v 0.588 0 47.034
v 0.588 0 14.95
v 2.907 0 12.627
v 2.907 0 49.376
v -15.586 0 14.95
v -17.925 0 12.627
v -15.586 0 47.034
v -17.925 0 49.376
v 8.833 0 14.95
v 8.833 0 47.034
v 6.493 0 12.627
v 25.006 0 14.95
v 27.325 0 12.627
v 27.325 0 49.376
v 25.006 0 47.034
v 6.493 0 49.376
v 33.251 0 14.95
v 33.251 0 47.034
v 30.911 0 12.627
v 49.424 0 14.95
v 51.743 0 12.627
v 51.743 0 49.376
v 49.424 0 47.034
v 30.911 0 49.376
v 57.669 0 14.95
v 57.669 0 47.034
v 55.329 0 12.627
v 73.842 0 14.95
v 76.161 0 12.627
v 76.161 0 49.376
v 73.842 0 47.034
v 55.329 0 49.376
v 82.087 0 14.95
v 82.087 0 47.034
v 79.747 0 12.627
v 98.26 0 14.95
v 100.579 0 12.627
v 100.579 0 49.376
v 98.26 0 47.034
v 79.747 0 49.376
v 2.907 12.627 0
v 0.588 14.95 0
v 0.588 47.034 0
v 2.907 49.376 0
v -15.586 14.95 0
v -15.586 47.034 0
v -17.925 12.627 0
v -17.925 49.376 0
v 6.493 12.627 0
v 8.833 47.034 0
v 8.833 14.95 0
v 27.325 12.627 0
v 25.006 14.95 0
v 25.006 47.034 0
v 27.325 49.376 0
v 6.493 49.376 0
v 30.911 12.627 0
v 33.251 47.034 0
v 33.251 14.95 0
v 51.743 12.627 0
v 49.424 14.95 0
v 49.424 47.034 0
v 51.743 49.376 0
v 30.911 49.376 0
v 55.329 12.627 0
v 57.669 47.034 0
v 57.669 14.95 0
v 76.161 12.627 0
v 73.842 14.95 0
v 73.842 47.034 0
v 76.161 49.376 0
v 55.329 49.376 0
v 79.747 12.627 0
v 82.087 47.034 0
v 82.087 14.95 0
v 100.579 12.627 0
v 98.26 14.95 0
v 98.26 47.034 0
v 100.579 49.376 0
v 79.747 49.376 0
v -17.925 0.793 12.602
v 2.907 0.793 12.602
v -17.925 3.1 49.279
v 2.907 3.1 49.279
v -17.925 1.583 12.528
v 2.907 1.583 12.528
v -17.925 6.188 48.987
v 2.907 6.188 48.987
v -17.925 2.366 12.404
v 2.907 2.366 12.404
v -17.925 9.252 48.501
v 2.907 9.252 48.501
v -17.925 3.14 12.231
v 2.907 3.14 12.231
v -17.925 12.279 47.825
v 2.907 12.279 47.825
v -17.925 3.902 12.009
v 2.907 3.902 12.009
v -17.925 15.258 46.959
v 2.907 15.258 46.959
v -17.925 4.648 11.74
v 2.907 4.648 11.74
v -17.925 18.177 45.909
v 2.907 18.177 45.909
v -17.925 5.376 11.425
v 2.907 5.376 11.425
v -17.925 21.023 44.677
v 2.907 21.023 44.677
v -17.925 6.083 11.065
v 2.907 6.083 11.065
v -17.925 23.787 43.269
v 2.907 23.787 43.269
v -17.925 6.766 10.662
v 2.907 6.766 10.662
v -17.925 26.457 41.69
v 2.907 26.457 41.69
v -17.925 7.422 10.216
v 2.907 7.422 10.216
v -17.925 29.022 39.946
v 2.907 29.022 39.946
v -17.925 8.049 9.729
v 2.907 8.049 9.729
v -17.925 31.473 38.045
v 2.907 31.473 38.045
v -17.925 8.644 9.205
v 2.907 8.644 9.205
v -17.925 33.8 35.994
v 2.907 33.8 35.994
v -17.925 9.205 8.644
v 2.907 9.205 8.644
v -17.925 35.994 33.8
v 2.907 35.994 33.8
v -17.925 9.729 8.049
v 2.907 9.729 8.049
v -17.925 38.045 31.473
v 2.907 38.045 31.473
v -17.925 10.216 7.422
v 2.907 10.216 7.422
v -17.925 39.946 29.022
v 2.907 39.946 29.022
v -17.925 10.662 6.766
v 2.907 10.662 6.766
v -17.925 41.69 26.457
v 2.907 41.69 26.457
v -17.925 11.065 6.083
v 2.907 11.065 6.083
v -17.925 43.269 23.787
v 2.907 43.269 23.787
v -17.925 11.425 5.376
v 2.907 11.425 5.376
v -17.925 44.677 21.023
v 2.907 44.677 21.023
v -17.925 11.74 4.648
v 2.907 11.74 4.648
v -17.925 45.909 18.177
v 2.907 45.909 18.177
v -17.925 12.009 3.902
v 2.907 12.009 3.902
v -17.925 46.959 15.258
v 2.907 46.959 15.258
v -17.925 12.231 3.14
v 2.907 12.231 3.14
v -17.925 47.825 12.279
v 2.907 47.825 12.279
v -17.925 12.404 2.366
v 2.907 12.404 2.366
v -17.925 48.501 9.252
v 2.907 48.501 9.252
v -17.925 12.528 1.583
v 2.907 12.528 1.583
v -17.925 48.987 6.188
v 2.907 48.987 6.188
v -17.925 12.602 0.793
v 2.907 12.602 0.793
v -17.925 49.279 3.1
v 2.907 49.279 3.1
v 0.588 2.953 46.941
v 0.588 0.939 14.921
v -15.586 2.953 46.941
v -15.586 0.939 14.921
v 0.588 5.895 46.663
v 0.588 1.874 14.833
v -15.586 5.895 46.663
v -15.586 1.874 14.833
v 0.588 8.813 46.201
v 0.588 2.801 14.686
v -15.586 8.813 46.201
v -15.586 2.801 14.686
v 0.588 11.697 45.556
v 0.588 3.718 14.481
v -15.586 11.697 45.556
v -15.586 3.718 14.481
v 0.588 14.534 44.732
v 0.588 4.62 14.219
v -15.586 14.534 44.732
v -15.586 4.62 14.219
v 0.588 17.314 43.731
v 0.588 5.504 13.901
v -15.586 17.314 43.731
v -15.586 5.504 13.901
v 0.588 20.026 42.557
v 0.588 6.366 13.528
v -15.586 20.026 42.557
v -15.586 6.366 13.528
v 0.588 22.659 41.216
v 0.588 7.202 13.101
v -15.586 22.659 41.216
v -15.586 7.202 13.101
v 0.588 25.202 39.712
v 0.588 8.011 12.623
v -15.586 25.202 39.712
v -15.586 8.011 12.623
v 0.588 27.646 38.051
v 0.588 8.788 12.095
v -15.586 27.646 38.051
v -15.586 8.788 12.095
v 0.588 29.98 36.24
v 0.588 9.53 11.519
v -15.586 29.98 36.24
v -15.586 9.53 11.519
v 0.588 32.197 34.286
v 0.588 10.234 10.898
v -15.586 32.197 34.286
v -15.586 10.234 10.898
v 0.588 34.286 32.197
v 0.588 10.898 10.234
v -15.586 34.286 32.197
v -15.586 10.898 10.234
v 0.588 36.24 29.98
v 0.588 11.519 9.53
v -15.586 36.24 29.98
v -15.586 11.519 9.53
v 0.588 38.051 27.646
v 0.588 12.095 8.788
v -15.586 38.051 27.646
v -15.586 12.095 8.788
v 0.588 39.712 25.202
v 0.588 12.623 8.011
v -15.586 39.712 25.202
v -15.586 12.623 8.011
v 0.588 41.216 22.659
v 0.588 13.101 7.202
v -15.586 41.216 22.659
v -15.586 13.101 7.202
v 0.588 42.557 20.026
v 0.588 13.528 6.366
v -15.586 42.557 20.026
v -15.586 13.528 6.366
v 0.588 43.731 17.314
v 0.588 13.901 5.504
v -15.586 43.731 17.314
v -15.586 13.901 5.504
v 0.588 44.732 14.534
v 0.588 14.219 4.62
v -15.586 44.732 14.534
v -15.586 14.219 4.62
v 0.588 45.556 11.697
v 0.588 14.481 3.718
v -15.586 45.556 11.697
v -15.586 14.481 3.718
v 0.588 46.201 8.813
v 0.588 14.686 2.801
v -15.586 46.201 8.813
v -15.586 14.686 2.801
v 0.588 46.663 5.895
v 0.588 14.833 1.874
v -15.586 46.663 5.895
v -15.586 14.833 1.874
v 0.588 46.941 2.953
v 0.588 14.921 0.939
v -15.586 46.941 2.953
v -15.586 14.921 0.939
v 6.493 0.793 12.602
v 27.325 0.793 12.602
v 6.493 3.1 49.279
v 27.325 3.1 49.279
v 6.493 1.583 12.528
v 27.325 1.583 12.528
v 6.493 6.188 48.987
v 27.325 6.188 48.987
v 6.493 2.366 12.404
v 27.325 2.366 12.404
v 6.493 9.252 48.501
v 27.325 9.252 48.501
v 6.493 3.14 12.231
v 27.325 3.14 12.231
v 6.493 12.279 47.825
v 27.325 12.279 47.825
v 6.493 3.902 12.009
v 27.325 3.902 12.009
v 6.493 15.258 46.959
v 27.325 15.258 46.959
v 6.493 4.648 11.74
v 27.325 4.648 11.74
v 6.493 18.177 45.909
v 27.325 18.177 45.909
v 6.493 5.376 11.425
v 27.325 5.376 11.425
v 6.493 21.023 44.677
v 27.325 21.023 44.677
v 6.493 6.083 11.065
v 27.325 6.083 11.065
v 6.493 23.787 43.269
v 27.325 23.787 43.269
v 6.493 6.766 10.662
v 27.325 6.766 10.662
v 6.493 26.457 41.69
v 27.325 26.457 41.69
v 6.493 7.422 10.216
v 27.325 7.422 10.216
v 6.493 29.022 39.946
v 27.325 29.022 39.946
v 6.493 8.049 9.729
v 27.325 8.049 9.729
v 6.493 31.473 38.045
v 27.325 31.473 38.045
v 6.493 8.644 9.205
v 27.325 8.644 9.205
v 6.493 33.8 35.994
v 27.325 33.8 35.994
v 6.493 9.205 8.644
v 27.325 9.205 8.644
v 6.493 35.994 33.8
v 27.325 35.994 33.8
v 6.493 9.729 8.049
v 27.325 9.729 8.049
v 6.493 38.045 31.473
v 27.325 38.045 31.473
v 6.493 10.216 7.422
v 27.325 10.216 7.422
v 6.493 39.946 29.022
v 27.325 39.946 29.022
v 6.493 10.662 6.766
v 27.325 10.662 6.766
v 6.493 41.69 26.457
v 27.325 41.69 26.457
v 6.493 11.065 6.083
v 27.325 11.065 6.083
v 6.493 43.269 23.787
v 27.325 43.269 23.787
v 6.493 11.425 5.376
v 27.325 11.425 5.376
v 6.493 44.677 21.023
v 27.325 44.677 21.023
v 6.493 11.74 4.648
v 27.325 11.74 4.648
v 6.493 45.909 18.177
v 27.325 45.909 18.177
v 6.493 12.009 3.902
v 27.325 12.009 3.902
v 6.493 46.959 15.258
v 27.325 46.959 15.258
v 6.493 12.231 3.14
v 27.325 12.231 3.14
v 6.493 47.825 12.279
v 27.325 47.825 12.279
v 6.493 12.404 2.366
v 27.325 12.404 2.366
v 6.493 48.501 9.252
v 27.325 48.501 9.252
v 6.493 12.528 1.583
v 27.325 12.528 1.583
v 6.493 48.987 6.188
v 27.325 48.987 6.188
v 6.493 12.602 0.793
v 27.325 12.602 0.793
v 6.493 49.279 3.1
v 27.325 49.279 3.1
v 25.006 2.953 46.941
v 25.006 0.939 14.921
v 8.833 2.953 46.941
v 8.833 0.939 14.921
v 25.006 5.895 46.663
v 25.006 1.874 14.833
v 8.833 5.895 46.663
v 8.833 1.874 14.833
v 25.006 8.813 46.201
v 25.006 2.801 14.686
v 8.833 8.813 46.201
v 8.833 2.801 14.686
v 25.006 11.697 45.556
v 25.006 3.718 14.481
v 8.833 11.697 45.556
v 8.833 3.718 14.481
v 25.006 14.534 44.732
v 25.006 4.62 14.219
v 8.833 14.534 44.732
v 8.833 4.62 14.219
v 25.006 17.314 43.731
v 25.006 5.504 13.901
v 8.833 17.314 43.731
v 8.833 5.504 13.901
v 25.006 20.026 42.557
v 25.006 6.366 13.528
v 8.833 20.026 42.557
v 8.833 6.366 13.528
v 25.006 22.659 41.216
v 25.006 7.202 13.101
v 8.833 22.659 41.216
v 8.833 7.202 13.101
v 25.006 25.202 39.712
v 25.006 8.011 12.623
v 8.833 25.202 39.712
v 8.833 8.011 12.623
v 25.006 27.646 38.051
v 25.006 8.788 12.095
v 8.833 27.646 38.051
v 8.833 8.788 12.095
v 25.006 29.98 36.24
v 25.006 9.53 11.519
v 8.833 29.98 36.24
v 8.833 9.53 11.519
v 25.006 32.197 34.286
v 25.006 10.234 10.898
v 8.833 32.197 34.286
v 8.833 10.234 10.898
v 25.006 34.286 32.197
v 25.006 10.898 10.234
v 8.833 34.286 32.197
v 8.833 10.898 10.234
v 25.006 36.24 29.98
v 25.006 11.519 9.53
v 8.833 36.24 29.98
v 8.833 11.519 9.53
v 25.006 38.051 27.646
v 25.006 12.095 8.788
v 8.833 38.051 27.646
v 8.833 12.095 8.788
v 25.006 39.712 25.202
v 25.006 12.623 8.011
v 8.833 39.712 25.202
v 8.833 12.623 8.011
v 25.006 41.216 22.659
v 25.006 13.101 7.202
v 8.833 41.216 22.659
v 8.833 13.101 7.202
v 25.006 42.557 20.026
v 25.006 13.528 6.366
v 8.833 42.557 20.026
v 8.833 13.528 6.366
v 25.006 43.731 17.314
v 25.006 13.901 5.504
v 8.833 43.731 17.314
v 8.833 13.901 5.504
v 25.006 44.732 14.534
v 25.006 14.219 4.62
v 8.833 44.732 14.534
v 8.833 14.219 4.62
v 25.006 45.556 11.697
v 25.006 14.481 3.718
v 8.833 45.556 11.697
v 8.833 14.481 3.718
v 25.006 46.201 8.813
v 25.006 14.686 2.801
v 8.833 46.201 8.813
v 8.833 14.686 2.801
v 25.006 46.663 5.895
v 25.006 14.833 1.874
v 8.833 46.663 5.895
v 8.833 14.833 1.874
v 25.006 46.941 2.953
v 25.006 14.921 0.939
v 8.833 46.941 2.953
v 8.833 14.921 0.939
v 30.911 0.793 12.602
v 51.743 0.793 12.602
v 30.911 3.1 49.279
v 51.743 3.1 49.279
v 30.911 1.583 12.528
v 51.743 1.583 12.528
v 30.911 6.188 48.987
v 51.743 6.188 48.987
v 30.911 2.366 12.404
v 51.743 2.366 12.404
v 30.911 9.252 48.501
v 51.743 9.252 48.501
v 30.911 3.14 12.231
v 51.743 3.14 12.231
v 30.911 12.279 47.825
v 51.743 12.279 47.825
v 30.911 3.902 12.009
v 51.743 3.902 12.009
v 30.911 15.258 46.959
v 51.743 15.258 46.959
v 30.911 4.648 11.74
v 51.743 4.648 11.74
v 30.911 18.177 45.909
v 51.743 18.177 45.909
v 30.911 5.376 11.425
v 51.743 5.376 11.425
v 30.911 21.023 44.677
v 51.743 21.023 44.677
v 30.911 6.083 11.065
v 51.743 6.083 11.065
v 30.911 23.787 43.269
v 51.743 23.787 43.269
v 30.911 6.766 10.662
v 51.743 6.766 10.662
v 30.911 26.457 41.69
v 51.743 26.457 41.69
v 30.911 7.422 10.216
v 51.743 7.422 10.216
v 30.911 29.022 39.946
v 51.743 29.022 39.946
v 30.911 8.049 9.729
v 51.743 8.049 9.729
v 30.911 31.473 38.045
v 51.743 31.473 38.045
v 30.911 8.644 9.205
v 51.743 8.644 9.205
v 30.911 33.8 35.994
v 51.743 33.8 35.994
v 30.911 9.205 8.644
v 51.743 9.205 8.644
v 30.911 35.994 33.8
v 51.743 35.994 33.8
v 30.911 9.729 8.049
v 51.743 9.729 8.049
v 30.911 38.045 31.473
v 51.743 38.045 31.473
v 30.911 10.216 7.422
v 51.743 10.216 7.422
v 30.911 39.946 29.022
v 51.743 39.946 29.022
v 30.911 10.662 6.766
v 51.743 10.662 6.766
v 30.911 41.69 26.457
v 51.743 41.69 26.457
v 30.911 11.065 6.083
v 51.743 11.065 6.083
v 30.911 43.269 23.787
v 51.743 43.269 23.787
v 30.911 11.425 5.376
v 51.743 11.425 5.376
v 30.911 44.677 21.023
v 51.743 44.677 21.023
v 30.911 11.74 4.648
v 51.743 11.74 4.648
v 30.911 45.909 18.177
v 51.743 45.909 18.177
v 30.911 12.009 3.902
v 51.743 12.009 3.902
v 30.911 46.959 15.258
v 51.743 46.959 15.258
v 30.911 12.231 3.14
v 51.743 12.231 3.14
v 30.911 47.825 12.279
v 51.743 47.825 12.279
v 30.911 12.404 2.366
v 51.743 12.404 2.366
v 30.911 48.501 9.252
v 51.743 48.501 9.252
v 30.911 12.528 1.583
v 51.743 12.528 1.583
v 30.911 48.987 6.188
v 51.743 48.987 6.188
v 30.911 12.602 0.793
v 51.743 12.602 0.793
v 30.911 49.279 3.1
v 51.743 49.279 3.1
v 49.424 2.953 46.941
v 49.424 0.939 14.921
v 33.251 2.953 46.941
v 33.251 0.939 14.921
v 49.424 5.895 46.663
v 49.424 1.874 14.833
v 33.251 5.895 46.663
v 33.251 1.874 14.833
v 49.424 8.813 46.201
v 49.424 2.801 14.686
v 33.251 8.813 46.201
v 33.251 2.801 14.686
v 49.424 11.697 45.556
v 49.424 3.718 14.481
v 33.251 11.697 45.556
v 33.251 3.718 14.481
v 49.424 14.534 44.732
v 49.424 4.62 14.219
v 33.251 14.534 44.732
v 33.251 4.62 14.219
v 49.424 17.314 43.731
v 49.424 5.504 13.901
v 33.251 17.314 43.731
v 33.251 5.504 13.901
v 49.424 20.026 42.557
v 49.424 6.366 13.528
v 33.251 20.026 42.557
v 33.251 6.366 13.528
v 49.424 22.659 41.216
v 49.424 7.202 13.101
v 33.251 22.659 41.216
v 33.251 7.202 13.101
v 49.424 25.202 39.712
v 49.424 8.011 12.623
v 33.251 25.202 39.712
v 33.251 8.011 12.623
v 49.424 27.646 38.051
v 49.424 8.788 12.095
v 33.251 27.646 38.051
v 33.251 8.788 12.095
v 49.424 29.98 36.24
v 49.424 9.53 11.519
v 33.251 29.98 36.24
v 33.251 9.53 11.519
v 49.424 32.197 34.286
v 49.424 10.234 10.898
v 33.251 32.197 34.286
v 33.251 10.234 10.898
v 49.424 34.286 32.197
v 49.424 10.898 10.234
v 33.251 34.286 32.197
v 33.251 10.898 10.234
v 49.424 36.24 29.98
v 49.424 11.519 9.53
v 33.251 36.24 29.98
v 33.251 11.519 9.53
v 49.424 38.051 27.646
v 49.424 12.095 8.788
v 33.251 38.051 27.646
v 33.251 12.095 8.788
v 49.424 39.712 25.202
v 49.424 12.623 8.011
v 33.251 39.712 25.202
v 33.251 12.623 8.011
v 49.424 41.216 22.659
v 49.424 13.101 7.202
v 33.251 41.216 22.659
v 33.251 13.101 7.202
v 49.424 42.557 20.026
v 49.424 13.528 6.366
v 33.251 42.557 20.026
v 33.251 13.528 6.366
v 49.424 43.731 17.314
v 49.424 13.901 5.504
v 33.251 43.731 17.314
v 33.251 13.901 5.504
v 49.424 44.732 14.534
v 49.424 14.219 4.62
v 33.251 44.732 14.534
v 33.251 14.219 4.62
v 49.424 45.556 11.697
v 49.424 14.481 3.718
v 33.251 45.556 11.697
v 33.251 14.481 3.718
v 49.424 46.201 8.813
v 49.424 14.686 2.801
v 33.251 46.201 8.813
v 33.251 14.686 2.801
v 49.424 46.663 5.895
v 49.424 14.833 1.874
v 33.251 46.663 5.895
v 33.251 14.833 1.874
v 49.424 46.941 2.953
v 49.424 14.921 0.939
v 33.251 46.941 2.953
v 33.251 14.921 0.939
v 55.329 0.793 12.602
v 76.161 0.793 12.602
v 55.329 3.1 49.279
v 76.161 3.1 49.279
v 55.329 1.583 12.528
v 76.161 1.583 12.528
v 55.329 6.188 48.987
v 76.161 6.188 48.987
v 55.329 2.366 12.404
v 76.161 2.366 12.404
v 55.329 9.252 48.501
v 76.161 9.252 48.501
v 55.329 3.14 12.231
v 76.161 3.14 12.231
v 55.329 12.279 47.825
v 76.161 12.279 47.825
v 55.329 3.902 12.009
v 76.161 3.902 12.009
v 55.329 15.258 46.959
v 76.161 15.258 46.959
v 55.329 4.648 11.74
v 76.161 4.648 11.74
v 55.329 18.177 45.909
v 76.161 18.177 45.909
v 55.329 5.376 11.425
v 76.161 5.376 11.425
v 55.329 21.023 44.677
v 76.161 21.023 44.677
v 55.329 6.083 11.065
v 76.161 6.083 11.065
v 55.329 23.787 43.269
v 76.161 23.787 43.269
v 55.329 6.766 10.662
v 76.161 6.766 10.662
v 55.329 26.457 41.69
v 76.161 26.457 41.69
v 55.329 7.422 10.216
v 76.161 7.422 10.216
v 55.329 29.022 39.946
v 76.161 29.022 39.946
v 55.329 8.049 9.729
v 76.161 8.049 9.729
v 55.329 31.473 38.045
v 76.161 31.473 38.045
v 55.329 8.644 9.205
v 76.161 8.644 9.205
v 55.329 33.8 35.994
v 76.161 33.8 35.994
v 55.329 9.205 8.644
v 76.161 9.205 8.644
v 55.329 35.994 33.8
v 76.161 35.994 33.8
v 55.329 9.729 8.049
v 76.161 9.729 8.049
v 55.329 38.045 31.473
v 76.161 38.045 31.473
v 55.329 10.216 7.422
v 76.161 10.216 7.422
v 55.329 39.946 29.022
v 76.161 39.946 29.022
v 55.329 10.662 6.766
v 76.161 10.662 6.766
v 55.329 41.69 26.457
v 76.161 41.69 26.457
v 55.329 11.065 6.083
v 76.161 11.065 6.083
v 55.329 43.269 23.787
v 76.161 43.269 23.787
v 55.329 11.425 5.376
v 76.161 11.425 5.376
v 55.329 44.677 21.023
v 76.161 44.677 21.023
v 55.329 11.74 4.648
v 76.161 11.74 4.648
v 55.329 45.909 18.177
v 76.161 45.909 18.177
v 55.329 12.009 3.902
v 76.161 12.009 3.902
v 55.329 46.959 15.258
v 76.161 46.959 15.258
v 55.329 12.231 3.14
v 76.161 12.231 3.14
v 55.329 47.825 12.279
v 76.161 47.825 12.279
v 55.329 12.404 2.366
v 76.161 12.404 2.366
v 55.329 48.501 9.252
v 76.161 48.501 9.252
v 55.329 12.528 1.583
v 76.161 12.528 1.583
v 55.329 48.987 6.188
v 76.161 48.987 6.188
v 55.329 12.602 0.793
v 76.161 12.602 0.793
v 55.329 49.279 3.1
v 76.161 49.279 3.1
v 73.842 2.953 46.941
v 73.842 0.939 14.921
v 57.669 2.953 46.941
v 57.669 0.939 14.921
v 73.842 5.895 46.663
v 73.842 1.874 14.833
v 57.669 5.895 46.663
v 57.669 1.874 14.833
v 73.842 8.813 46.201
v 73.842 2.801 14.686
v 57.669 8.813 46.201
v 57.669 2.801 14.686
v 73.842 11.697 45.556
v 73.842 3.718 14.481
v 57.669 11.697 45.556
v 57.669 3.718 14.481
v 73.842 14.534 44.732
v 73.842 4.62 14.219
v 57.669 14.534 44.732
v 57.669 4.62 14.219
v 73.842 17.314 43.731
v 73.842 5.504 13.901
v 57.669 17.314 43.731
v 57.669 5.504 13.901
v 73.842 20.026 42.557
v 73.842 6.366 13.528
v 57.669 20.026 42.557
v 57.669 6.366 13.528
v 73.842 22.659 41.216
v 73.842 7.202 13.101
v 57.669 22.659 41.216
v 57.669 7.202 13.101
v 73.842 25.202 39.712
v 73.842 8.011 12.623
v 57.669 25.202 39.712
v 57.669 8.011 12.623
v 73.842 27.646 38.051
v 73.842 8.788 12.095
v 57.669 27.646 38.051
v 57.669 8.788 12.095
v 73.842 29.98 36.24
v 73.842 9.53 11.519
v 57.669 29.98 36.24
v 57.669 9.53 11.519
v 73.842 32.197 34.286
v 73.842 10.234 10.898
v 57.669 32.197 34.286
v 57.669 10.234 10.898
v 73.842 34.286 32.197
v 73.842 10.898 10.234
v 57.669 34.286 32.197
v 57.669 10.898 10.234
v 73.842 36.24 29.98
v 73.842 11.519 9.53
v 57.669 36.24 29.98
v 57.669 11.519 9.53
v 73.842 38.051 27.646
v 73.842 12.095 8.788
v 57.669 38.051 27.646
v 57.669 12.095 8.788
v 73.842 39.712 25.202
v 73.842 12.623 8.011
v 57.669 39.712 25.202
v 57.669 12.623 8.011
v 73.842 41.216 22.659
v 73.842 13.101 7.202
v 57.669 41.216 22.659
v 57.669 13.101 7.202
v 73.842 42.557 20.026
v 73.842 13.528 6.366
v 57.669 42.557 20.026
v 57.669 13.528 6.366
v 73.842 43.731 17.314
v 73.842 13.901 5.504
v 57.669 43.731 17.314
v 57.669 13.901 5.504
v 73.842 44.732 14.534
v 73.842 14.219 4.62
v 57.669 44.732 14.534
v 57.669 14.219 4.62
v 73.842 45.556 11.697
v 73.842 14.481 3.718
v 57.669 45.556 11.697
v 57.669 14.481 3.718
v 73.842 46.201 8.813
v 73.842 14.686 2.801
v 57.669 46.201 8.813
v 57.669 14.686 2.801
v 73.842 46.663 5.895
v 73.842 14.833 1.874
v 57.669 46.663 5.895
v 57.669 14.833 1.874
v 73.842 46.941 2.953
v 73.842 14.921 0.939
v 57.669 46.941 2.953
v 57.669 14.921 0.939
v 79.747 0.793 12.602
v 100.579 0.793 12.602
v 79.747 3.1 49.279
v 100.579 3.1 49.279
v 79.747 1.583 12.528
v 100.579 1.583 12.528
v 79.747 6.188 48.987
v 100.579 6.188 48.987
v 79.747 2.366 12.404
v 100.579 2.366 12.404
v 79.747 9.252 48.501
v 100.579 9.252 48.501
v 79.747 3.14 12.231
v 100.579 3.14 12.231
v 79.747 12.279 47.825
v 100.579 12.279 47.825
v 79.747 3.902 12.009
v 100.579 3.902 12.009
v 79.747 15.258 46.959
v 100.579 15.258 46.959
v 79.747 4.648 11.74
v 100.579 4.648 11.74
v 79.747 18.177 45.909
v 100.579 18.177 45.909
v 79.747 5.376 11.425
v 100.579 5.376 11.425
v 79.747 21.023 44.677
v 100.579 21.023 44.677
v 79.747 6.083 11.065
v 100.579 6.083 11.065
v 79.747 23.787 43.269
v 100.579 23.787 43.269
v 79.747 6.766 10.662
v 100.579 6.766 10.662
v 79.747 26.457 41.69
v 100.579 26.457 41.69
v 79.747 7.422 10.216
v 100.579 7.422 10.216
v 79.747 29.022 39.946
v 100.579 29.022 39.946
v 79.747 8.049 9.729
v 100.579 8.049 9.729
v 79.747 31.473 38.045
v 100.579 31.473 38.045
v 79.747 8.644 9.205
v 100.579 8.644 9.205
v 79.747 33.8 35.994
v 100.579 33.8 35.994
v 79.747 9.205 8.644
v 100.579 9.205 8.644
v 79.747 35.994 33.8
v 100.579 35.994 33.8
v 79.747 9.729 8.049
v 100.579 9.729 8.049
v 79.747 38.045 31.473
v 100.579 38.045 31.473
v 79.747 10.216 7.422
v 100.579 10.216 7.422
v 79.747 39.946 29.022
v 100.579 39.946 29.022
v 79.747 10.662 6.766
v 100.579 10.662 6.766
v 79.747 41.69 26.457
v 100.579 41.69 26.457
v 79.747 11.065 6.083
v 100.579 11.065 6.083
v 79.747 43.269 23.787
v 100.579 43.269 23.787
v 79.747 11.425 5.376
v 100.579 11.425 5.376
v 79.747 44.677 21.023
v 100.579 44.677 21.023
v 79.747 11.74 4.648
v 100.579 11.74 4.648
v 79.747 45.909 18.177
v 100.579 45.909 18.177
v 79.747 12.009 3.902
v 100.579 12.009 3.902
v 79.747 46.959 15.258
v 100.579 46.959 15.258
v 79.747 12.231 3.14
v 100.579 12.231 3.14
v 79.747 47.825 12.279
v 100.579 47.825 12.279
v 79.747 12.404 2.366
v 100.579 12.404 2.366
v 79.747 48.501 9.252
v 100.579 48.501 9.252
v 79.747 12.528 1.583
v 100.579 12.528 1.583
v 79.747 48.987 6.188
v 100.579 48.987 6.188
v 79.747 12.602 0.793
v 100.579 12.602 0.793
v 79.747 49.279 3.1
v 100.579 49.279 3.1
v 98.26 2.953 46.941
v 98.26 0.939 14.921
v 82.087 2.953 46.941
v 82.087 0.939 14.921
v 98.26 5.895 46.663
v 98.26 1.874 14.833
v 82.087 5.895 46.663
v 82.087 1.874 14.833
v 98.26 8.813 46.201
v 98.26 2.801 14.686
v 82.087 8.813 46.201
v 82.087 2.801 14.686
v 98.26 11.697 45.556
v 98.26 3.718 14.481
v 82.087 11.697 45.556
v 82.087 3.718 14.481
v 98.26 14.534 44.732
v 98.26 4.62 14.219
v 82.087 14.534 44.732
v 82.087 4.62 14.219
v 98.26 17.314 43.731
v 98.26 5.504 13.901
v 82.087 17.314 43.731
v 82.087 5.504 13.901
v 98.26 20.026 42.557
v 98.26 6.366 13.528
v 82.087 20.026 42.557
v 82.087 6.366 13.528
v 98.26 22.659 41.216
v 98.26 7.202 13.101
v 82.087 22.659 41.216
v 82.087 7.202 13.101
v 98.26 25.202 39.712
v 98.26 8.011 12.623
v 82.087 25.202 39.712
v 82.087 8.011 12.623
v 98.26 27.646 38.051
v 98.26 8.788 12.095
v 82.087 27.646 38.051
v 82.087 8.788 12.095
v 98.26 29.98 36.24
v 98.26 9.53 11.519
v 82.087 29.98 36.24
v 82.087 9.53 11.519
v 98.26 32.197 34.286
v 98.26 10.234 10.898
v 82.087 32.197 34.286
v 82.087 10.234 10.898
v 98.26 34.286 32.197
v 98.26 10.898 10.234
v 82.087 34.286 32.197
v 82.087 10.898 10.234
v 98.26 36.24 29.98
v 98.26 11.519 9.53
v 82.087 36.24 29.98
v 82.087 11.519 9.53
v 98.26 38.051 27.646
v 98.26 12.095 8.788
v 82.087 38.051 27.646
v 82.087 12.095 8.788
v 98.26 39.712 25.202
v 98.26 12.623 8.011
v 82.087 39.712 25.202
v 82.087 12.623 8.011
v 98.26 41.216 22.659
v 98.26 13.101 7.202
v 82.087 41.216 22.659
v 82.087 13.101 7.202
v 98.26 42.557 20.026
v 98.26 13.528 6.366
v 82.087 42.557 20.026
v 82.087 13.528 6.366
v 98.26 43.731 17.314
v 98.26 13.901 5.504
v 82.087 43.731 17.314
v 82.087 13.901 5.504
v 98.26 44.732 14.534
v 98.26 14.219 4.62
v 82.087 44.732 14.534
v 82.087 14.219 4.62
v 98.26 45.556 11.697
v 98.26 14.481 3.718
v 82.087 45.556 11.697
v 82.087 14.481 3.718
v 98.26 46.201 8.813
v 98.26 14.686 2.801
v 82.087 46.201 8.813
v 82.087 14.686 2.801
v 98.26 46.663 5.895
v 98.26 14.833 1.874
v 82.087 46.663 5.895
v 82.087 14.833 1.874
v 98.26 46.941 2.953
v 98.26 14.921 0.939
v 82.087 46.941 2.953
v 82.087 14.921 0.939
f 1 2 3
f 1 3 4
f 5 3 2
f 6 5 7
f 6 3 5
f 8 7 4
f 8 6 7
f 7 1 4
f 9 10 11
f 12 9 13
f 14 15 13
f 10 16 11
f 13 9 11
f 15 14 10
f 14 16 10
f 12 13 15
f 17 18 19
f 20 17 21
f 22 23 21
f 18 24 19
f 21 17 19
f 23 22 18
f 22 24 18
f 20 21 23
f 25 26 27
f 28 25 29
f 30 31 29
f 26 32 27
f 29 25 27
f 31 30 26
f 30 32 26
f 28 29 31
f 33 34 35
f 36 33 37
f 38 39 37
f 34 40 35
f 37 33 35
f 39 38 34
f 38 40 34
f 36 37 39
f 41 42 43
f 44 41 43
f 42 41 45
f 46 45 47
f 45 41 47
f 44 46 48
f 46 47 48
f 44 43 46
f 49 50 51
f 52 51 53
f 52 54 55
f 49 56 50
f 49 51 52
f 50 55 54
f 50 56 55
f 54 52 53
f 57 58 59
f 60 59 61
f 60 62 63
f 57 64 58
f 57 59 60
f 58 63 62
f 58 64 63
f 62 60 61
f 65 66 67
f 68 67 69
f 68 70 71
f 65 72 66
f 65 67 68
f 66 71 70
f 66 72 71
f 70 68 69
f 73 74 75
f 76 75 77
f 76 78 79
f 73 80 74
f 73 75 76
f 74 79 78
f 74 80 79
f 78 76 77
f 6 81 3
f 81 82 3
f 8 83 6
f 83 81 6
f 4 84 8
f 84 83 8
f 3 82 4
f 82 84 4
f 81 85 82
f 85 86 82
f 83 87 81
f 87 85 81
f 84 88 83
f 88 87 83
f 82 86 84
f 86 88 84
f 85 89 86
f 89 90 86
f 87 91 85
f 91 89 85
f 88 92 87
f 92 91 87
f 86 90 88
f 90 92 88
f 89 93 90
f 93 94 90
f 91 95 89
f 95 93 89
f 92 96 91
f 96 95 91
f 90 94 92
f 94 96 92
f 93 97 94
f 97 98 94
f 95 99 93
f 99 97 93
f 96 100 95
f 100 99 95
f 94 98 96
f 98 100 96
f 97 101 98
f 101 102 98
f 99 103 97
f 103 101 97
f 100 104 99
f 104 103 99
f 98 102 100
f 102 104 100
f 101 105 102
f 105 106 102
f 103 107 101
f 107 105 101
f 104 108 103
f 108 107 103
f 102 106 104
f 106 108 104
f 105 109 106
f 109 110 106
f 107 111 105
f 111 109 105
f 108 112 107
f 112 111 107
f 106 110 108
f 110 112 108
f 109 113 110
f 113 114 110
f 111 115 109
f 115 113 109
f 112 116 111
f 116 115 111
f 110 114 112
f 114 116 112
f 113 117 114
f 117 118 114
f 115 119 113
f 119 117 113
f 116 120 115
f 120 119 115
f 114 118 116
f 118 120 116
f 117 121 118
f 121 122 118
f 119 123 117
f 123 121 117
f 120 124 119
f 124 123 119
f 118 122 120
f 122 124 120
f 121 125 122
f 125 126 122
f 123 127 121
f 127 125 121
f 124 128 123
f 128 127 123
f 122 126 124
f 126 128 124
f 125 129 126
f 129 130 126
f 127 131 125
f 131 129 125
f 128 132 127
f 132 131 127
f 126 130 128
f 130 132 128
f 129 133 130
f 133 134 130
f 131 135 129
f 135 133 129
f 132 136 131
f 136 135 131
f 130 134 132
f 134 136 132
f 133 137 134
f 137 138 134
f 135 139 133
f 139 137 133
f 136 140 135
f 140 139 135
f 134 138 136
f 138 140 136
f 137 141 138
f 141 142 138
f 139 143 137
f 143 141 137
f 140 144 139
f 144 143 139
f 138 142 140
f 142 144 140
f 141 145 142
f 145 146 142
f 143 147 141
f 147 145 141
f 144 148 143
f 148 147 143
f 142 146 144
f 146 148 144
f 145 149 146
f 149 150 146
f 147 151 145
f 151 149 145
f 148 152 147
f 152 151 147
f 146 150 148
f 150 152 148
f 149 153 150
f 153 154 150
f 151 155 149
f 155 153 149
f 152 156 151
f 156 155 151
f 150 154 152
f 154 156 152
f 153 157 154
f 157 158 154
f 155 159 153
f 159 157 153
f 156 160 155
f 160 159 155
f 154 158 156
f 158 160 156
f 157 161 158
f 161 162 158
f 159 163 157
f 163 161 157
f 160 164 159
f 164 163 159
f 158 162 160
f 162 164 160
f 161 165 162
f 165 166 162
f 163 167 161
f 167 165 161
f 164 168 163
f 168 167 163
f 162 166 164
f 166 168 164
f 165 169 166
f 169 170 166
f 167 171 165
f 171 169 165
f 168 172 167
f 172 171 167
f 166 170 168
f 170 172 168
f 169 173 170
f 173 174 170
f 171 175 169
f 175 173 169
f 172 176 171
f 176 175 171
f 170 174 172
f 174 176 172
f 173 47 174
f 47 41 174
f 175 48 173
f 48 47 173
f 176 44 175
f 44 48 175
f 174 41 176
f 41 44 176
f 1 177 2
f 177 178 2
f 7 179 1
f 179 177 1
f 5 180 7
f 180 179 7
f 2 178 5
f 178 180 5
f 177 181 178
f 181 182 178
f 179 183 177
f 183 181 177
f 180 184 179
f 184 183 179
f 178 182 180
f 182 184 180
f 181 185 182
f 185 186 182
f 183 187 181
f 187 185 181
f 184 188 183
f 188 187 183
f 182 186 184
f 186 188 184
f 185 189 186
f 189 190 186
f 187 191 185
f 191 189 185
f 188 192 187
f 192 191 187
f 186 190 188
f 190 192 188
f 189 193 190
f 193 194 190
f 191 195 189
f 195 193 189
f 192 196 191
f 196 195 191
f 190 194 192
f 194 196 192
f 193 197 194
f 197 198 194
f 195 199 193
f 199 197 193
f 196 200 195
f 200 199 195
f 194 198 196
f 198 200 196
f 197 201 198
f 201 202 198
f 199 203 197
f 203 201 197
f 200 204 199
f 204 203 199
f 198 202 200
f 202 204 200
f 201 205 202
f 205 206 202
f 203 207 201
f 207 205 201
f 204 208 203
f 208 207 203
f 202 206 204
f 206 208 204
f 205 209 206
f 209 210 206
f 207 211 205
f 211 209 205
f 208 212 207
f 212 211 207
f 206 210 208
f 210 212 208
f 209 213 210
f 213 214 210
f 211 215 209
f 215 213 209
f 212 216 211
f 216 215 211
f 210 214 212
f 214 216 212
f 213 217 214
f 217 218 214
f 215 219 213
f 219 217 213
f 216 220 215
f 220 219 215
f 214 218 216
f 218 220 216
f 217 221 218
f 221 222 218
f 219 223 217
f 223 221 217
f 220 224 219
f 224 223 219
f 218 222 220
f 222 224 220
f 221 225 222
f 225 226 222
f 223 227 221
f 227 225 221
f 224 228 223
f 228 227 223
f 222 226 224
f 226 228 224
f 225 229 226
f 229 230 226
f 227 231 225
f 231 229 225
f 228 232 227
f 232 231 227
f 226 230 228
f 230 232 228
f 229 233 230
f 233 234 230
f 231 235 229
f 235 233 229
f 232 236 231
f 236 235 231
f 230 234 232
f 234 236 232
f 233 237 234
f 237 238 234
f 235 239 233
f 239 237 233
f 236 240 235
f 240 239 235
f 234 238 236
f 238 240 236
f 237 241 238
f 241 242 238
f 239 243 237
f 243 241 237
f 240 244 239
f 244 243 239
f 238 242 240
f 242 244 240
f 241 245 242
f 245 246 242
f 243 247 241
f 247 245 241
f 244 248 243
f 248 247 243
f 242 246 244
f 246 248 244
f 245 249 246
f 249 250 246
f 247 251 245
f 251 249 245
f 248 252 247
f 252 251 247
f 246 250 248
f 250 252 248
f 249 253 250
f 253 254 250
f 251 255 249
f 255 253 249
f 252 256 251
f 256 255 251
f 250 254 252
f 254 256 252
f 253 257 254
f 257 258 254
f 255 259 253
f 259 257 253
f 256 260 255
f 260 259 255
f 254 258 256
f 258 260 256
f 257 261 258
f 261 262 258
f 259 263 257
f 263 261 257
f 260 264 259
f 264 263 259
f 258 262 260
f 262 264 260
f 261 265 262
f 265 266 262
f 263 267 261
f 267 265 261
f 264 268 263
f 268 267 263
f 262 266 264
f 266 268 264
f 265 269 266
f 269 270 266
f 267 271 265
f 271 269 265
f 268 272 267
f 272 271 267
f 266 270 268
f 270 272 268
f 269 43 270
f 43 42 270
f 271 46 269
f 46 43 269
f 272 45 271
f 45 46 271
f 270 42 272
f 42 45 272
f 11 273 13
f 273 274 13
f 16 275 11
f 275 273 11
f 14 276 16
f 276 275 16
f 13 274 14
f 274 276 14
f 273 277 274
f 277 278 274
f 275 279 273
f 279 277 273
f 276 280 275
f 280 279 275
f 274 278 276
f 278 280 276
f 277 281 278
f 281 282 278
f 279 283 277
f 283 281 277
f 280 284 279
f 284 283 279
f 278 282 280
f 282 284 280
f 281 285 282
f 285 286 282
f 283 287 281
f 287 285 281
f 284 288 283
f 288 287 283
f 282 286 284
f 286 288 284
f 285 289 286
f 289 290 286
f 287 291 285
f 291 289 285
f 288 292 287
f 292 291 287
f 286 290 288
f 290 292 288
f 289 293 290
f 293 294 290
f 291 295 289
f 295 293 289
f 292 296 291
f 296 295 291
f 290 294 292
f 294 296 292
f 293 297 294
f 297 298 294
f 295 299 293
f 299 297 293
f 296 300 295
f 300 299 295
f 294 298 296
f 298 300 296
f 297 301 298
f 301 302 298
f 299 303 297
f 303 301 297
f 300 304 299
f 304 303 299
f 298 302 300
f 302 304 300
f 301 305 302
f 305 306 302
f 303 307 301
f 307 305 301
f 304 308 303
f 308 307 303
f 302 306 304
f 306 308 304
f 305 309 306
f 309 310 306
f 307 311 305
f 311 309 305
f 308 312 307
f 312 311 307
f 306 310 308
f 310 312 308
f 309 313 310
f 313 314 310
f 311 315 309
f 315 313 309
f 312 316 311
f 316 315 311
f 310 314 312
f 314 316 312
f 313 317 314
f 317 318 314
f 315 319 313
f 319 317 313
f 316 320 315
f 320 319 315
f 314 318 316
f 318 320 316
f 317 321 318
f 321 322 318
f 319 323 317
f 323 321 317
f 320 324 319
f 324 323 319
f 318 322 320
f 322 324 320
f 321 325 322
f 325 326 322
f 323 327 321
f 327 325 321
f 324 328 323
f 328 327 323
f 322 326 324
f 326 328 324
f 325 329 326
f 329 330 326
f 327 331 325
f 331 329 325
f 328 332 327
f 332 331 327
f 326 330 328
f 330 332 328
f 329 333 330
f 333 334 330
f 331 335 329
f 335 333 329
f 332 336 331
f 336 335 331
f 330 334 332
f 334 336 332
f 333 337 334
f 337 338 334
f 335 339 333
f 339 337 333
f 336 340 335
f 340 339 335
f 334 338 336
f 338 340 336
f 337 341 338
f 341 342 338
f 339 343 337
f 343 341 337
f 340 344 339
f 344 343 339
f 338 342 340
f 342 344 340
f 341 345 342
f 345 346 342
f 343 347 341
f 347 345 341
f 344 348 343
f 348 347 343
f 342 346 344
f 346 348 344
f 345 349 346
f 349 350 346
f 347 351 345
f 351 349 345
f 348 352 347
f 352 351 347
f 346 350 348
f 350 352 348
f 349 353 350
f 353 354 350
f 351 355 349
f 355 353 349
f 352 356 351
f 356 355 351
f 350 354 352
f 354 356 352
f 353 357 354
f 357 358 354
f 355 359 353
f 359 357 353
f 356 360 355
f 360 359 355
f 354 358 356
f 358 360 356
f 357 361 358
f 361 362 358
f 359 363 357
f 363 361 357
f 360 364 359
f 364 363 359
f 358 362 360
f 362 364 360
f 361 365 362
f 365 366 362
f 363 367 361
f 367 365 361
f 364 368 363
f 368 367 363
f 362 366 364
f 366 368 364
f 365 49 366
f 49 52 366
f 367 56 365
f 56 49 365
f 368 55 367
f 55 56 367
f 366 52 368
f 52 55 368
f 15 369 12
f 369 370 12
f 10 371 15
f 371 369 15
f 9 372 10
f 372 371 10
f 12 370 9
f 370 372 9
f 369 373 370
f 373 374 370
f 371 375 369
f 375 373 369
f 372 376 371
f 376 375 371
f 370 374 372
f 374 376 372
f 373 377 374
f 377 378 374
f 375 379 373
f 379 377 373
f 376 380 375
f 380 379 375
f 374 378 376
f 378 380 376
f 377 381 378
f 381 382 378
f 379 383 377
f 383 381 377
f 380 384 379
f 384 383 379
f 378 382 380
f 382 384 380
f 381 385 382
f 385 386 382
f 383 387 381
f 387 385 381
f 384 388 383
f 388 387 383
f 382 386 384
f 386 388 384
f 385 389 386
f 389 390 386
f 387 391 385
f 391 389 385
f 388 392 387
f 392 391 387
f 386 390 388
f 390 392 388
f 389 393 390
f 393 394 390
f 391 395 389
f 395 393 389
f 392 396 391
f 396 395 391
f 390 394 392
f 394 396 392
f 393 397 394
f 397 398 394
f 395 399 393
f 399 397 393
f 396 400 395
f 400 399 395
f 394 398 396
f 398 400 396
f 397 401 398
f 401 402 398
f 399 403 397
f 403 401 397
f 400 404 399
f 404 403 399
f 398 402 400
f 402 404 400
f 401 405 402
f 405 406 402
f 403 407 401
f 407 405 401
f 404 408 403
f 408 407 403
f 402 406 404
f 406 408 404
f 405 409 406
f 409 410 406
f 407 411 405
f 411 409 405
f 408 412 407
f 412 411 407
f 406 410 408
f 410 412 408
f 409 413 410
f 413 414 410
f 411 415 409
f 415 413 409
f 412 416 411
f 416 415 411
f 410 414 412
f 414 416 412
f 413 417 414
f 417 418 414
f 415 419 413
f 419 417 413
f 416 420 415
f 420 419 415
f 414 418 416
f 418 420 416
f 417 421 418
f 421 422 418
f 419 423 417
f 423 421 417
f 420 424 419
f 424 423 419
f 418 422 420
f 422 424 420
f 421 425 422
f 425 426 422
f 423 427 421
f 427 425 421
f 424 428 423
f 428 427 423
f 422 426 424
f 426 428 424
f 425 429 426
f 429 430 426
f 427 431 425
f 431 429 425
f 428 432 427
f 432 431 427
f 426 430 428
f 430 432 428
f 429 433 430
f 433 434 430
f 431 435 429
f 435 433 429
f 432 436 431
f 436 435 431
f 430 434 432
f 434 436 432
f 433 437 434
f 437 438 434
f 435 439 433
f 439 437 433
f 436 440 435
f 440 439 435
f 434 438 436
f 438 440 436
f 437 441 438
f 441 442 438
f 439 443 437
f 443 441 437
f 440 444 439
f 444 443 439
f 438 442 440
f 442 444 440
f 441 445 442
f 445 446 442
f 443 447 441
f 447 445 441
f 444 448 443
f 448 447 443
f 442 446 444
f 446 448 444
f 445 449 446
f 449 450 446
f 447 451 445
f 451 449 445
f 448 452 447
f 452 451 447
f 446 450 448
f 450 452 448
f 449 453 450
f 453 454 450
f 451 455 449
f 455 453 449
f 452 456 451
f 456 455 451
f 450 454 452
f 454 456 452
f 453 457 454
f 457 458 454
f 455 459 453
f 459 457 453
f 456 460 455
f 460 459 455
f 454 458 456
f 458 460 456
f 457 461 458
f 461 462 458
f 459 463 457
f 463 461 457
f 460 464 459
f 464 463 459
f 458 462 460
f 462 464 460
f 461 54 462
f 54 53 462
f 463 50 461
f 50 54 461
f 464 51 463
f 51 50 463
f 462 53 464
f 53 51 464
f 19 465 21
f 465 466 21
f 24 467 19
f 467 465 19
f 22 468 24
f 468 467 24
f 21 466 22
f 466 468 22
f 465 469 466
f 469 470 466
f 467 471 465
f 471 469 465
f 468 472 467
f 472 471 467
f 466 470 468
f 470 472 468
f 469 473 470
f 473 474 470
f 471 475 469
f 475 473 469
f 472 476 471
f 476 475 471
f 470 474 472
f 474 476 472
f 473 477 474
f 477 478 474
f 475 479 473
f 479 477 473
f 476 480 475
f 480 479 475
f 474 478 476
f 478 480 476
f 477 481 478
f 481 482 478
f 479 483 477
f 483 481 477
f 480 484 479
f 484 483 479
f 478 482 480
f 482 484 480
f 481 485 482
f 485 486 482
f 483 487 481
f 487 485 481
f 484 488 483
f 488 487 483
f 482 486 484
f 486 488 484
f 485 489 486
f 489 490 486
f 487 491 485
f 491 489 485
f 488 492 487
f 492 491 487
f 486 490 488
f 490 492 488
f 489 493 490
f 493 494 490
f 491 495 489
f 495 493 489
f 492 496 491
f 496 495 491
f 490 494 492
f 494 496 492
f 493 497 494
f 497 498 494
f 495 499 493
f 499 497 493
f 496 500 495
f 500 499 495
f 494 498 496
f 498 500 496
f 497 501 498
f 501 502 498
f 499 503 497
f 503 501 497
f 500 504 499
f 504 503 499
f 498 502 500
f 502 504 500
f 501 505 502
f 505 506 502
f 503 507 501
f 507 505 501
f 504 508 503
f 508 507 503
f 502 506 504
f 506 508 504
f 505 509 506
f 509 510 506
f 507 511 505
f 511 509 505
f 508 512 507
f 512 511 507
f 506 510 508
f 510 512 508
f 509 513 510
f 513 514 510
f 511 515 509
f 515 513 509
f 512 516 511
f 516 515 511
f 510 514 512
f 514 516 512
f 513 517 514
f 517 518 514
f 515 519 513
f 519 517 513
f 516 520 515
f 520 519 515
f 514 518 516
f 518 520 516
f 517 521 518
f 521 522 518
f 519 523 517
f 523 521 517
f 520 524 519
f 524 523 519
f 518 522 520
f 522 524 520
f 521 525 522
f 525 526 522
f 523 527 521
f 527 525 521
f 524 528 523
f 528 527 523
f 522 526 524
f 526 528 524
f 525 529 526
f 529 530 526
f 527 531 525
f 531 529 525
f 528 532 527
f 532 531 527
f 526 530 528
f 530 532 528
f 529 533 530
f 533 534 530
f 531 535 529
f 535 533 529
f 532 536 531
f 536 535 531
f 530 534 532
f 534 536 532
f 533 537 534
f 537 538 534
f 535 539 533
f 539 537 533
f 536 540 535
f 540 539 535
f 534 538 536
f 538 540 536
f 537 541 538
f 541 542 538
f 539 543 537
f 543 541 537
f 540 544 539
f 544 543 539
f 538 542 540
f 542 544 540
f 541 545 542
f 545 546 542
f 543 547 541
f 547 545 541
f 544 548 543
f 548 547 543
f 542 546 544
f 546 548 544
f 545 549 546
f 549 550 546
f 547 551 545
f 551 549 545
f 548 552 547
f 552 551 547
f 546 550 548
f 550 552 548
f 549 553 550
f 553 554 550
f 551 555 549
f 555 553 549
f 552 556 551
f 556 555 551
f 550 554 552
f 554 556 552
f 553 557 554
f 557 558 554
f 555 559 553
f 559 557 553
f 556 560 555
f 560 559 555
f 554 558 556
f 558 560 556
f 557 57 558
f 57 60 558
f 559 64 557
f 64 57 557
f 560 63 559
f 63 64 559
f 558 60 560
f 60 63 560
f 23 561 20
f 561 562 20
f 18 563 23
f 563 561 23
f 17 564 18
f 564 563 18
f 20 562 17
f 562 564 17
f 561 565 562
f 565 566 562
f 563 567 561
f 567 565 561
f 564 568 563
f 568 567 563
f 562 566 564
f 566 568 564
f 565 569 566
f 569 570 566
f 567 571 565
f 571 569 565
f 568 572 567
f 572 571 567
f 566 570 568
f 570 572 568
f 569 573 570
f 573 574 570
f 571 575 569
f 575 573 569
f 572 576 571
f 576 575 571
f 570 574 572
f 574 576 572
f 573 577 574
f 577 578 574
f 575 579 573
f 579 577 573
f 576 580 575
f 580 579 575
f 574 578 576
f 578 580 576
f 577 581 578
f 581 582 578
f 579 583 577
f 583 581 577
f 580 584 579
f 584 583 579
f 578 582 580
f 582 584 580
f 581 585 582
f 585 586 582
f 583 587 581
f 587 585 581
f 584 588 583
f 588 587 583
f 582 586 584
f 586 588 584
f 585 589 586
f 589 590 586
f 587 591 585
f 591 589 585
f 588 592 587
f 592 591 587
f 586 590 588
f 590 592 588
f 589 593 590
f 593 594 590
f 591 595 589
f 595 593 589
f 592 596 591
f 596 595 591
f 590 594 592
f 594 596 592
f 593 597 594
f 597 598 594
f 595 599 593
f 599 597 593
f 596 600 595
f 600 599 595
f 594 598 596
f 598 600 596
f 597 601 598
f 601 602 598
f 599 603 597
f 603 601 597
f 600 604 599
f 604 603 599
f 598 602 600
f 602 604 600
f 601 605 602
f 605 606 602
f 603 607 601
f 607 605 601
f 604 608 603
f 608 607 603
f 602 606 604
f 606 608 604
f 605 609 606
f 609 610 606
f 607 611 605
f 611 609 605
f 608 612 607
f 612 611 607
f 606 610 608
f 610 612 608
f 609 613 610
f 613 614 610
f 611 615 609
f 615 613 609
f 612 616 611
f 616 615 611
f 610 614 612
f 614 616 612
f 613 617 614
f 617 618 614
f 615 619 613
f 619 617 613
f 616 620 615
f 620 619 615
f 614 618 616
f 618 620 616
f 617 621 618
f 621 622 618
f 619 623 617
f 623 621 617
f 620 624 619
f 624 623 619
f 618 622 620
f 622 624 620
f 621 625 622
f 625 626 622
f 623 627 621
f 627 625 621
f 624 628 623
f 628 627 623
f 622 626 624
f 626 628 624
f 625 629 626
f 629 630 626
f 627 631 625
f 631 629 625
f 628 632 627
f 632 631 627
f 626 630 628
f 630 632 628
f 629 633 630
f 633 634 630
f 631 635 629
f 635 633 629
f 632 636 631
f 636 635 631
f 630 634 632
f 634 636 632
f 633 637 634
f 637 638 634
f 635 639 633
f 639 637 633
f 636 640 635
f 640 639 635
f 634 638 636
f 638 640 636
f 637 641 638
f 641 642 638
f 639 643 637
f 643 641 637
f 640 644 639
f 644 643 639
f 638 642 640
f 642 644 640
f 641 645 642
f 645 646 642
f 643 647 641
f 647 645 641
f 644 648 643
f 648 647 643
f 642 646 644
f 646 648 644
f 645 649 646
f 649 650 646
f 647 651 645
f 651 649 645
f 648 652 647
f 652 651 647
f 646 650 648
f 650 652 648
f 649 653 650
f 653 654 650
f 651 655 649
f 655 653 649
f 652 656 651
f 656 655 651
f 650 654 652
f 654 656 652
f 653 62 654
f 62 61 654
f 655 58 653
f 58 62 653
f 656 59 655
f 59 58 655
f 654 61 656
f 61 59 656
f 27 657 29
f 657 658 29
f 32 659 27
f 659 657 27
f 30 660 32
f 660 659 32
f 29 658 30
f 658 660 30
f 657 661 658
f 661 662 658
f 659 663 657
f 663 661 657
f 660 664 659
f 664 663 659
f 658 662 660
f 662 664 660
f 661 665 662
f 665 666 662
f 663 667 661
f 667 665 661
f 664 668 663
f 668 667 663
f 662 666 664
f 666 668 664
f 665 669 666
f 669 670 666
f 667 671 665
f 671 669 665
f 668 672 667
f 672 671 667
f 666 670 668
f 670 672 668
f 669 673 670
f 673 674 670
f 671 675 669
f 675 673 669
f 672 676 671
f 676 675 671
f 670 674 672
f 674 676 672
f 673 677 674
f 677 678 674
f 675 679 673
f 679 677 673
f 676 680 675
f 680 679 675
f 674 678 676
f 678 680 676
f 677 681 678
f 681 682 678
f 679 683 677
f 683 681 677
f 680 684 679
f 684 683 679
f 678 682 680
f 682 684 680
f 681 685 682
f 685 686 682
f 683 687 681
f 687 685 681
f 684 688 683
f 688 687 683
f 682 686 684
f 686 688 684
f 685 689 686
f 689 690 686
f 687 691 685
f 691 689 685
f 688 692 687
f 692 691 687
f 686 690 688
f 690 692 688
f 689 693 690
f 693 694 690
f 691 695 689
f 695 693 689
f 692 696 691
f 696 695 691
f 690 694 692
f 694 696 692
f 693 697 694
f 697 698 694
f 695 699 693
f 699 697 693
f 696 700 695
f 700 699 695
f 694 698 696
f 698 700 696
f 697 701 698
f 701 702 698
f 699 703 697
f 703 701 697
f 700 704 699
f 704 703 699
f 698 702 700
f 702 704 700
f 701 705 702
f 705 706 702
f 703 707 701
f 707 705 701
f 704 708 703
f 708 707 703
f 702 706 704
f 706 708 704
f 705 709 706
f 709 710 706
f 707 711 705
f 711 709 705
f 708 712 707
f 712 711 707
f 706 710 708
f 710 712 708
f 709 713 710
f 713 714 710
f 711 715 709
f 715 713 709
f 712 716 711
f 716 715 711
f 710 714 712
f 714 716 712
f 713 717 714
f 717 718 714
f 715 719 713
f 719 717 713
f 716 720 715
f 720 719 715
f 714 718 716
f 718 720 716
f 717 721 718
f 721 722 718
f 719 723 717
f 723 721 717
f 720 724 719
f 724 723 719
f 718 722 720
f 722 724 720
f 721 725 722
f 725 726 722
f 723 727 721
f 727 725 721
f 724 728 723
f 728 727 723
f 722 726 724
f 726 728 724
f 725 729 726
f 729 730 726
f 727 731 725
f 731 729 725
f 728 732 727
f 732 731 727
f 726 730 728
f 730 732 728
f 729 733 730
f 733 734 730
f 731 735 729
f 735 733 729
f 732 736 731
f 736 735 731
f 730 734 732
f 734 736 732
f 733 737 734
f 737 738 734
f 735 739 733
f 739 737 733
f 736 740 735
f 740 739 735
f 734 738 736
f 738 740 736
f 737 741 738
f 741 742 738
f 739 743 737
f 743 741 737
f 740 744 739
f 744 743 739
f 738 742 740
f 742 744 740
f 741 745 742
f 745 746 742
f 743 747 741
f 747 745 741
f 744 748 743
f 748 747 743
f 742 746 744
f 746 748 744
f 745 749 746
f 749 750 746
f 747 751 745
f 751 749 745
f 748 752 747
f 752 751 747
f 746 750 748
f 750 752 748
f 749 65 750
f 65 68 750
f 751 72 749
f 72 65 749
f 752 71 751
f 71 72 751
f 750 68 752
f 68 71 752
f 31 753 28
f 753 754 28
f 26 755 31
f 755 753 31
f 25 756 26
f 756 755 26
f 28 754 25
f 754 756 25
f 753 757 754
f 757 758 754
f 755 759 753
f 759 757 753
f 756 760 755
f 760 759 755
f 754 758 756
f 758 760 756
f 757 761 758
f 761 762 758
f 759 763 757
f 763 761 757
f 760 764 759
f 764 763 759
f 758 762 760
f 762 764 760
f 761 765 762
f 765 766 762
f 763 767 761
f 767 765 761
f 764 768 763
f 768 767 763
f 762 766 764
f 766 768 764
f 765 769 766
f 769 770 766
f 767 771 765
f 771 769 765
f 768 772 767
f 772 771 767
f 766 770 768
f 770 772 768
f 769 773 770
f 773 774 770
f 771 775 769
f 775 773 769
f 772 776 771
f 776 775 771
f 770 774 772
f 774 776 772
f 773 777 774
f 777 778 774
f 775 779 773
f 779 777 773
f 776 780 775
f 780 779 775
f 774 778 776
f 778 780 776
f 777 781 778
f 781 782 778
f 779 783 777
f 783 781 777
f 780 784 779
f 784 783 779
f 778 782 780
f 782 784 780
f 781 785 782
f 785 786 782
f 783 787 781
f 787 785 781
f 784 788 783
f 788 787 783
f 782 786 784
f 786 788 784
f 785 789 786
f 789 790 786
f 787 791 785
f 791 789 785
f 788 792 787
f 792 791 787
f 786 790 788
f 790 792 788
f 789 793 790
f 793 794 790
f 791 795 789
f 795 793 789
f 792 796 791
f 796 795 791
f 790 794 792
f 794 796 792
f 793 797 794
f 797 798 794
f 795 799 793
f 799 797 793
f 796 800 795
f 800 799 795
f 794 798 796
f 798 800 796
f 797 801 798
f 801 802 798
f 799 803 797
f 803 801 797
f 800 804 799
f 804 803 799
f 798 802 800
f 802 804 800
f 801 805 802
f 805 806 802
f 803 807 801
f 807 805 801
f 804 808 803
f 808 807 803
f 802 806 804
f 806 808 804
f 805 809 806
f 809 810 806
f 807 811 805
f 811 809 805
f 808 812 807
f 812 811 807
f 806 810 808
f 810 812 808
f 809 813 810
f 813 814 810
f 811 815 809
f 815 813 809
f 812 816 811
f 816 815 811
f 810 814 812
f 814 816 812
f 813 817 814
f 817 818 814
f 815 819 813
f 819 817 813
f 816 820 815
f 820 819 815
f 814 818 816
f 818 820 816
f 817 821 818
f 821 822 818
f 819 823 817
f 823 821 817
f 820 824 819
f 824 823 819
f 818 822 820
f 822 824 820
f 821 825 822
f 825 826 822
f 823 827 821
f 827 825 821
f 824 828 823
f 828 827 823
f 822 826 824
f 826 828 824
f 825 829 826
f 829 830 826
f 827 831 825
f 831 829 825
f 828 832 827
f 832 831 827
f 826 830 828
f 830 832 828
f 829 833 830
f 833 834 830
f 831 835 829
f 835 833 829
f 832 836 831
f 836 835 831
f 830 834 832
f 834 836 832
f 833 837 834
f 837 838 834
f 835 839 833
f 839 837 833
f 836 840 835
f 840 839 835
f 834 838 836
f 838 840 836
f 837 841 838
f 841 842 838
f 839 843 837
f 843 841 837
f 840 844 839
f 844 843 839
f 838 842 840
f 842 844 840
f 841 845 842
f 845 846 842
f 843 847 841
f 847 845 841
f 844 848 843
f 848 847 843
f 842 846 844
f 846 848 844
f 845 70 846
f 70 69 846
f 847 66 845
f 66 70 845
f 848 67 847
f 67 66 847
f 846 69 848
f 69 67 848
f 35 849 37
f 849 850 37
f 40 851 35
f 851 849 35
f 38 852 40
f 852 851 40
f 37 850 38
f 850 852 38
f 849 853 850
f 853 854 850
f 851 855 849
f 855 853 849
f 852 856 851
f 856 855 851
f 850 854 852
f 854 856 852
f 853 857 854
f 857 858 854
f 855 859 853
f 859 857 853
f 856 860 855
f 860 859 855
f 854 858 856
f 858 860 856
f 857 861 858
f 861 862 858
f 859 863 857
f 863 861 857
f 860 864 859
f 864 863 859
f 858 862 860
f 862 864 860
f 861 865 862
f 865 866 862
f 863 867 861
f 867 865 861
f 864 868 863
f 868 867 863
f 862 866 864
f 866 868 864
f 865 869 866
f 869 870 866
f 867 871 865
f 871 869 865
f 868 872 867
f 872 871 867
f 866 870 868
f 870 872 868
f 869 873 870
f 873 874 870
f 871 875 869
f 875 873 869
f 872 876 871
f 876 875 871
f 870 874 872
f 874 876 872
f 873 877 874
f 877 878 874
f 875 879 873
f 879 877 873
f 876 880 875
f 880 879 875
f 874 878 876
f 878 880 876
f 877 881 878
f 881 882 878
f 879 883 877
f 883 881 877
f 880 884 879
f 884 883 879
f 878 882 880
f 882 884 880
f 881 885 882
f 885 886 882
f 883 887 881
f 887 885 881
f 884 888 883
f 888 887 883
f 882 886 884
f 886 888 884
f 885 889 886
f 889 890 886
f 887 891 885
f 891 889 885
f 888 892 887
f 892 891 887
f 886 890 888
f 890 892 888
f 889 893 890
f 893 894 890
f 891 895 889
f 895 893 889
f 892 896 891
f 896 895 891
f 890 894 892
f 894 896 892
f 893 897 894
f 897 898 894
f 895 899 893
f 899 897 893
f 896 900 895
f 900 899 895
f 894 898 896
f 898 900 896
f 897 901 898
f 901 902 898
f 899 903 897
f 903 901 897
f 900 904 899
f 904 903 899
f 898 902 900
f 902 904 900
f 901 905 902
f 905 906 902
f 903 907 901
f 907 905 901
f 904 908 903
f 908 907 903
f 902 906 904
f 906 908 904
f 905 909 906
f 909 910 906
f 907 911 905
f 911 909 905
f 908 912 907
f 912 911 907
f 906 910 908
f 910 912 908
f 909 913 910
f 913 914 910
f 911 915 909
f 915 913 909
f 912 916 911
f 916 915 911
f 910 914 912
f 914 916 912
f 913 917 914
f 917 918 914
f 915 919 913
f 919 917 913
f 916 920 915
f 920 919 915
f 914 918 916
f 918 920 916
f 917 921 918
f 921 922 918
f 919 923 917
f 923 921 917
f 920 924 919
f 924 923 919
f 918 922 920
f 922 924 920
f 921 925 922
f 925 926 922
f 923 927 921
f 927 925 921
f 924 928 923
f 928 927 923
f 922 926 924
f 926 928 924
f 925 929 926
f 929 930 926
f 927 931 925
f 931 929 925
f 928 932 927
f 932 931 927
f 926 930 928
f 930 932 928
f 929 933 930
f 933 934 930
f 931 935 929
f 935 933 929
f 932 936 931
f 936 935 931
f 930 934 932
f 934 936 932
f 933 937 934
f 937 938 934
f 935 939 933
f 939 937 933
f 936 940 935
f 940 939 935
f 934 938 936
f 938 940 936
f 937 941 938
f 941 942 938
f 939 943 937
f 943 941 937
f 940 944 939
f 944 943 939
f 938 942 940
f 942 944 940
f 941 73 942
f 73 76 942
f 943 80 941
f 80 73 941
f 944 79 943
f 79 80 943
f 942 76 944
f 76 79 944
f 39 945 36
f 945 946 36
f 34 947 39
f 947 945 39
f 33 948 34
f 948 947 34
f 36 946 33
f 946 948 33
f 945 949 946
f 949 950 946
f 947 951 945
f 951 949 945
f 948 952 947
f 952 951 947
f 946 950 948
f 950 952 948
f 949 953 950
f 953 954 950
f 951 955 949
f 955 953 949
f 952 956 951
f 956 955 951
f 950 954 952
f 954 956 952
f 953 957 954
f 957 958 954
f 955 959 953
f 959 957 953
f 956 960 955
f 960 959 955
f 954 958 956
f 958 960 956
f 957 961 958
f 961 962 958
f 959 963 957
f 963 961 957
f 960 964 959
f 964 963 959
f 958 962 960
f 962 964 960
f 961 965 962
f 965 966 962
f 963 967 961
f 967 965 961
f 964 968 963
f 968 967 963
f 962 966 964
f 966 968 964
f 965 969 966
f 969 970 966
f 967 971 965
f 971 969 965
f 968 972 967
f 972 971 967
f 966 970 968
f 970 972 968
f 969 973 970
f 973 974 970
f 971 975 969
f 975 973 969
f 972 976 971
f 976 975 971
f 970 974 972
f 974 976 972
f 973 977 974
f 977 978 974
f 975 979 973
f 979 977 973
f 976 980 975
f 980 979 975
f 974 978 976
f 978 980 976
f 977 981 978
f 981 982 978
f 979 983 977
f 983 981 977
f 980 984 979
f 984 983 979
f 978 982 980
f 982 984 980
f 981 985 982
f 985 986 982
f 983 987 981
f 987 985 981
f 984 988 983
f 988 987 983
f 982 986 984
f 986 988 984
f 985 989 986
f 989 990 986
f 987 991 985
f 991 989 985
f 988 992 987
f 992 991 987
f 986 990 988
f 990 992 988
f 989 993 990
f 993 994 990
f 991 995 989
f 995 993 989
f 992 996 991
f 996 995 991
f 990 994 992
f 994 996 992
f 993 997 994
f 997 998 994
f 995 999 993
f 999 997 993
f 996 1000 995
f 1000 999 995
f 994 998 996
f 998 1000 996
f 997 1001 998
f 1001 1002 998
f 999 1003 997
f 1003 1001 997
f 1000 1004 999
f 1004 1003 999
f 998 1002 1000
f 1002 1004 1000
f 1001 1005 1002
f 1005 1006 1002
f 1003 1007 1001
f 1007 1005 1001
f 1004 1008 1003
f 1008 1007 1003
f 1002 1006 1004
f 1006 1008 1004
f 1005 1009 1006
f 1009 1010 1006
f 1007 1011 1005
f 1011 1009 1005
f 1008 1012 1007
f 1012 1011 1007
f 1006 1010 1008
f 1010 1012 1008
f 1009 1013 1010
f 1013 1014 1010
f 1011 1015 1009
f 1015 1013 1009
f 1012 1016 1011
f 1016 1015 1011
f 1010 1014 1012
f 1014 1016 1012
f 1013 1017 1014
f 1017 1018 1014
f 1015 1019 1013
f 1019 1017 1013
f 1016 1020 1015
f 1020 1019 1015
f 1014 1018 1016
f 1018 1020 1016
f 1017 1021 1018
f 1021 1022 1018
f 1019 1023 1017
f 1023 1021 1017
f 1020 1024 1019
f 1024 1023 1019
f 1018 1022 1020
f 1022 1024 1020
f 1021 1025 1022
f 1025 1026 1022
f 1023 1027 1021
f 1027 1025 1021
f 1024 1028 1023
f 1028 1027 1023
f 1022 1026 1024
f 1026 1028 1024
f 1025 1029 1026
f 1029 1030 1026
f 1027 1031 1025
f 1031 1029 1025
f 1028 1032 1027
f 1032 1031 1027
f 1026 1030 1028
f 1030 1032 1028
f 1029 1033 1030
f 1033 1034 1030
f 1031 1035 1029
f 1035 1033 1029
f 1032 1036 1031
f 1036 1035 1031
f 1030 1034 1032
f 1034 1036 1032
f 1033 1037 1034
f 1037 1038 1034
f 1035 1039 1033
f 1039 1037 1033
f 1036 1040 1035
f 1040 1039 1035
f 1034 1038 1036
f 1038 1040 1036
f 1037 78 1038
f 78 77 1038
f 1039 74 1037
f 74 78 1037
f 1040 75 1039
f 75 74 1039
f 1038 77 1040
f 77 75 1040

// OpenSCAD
$fn=100; //精度
rotate([0,-90,0]) rotate_extrude(angle=90){ //下面一行第一个20调整弧度大小
  translate([20,20,0]) rotate([0,0,-90]) text("可为的基地", size=30, font="FZZJ\\-LongYTJW:style=Regular");
}
